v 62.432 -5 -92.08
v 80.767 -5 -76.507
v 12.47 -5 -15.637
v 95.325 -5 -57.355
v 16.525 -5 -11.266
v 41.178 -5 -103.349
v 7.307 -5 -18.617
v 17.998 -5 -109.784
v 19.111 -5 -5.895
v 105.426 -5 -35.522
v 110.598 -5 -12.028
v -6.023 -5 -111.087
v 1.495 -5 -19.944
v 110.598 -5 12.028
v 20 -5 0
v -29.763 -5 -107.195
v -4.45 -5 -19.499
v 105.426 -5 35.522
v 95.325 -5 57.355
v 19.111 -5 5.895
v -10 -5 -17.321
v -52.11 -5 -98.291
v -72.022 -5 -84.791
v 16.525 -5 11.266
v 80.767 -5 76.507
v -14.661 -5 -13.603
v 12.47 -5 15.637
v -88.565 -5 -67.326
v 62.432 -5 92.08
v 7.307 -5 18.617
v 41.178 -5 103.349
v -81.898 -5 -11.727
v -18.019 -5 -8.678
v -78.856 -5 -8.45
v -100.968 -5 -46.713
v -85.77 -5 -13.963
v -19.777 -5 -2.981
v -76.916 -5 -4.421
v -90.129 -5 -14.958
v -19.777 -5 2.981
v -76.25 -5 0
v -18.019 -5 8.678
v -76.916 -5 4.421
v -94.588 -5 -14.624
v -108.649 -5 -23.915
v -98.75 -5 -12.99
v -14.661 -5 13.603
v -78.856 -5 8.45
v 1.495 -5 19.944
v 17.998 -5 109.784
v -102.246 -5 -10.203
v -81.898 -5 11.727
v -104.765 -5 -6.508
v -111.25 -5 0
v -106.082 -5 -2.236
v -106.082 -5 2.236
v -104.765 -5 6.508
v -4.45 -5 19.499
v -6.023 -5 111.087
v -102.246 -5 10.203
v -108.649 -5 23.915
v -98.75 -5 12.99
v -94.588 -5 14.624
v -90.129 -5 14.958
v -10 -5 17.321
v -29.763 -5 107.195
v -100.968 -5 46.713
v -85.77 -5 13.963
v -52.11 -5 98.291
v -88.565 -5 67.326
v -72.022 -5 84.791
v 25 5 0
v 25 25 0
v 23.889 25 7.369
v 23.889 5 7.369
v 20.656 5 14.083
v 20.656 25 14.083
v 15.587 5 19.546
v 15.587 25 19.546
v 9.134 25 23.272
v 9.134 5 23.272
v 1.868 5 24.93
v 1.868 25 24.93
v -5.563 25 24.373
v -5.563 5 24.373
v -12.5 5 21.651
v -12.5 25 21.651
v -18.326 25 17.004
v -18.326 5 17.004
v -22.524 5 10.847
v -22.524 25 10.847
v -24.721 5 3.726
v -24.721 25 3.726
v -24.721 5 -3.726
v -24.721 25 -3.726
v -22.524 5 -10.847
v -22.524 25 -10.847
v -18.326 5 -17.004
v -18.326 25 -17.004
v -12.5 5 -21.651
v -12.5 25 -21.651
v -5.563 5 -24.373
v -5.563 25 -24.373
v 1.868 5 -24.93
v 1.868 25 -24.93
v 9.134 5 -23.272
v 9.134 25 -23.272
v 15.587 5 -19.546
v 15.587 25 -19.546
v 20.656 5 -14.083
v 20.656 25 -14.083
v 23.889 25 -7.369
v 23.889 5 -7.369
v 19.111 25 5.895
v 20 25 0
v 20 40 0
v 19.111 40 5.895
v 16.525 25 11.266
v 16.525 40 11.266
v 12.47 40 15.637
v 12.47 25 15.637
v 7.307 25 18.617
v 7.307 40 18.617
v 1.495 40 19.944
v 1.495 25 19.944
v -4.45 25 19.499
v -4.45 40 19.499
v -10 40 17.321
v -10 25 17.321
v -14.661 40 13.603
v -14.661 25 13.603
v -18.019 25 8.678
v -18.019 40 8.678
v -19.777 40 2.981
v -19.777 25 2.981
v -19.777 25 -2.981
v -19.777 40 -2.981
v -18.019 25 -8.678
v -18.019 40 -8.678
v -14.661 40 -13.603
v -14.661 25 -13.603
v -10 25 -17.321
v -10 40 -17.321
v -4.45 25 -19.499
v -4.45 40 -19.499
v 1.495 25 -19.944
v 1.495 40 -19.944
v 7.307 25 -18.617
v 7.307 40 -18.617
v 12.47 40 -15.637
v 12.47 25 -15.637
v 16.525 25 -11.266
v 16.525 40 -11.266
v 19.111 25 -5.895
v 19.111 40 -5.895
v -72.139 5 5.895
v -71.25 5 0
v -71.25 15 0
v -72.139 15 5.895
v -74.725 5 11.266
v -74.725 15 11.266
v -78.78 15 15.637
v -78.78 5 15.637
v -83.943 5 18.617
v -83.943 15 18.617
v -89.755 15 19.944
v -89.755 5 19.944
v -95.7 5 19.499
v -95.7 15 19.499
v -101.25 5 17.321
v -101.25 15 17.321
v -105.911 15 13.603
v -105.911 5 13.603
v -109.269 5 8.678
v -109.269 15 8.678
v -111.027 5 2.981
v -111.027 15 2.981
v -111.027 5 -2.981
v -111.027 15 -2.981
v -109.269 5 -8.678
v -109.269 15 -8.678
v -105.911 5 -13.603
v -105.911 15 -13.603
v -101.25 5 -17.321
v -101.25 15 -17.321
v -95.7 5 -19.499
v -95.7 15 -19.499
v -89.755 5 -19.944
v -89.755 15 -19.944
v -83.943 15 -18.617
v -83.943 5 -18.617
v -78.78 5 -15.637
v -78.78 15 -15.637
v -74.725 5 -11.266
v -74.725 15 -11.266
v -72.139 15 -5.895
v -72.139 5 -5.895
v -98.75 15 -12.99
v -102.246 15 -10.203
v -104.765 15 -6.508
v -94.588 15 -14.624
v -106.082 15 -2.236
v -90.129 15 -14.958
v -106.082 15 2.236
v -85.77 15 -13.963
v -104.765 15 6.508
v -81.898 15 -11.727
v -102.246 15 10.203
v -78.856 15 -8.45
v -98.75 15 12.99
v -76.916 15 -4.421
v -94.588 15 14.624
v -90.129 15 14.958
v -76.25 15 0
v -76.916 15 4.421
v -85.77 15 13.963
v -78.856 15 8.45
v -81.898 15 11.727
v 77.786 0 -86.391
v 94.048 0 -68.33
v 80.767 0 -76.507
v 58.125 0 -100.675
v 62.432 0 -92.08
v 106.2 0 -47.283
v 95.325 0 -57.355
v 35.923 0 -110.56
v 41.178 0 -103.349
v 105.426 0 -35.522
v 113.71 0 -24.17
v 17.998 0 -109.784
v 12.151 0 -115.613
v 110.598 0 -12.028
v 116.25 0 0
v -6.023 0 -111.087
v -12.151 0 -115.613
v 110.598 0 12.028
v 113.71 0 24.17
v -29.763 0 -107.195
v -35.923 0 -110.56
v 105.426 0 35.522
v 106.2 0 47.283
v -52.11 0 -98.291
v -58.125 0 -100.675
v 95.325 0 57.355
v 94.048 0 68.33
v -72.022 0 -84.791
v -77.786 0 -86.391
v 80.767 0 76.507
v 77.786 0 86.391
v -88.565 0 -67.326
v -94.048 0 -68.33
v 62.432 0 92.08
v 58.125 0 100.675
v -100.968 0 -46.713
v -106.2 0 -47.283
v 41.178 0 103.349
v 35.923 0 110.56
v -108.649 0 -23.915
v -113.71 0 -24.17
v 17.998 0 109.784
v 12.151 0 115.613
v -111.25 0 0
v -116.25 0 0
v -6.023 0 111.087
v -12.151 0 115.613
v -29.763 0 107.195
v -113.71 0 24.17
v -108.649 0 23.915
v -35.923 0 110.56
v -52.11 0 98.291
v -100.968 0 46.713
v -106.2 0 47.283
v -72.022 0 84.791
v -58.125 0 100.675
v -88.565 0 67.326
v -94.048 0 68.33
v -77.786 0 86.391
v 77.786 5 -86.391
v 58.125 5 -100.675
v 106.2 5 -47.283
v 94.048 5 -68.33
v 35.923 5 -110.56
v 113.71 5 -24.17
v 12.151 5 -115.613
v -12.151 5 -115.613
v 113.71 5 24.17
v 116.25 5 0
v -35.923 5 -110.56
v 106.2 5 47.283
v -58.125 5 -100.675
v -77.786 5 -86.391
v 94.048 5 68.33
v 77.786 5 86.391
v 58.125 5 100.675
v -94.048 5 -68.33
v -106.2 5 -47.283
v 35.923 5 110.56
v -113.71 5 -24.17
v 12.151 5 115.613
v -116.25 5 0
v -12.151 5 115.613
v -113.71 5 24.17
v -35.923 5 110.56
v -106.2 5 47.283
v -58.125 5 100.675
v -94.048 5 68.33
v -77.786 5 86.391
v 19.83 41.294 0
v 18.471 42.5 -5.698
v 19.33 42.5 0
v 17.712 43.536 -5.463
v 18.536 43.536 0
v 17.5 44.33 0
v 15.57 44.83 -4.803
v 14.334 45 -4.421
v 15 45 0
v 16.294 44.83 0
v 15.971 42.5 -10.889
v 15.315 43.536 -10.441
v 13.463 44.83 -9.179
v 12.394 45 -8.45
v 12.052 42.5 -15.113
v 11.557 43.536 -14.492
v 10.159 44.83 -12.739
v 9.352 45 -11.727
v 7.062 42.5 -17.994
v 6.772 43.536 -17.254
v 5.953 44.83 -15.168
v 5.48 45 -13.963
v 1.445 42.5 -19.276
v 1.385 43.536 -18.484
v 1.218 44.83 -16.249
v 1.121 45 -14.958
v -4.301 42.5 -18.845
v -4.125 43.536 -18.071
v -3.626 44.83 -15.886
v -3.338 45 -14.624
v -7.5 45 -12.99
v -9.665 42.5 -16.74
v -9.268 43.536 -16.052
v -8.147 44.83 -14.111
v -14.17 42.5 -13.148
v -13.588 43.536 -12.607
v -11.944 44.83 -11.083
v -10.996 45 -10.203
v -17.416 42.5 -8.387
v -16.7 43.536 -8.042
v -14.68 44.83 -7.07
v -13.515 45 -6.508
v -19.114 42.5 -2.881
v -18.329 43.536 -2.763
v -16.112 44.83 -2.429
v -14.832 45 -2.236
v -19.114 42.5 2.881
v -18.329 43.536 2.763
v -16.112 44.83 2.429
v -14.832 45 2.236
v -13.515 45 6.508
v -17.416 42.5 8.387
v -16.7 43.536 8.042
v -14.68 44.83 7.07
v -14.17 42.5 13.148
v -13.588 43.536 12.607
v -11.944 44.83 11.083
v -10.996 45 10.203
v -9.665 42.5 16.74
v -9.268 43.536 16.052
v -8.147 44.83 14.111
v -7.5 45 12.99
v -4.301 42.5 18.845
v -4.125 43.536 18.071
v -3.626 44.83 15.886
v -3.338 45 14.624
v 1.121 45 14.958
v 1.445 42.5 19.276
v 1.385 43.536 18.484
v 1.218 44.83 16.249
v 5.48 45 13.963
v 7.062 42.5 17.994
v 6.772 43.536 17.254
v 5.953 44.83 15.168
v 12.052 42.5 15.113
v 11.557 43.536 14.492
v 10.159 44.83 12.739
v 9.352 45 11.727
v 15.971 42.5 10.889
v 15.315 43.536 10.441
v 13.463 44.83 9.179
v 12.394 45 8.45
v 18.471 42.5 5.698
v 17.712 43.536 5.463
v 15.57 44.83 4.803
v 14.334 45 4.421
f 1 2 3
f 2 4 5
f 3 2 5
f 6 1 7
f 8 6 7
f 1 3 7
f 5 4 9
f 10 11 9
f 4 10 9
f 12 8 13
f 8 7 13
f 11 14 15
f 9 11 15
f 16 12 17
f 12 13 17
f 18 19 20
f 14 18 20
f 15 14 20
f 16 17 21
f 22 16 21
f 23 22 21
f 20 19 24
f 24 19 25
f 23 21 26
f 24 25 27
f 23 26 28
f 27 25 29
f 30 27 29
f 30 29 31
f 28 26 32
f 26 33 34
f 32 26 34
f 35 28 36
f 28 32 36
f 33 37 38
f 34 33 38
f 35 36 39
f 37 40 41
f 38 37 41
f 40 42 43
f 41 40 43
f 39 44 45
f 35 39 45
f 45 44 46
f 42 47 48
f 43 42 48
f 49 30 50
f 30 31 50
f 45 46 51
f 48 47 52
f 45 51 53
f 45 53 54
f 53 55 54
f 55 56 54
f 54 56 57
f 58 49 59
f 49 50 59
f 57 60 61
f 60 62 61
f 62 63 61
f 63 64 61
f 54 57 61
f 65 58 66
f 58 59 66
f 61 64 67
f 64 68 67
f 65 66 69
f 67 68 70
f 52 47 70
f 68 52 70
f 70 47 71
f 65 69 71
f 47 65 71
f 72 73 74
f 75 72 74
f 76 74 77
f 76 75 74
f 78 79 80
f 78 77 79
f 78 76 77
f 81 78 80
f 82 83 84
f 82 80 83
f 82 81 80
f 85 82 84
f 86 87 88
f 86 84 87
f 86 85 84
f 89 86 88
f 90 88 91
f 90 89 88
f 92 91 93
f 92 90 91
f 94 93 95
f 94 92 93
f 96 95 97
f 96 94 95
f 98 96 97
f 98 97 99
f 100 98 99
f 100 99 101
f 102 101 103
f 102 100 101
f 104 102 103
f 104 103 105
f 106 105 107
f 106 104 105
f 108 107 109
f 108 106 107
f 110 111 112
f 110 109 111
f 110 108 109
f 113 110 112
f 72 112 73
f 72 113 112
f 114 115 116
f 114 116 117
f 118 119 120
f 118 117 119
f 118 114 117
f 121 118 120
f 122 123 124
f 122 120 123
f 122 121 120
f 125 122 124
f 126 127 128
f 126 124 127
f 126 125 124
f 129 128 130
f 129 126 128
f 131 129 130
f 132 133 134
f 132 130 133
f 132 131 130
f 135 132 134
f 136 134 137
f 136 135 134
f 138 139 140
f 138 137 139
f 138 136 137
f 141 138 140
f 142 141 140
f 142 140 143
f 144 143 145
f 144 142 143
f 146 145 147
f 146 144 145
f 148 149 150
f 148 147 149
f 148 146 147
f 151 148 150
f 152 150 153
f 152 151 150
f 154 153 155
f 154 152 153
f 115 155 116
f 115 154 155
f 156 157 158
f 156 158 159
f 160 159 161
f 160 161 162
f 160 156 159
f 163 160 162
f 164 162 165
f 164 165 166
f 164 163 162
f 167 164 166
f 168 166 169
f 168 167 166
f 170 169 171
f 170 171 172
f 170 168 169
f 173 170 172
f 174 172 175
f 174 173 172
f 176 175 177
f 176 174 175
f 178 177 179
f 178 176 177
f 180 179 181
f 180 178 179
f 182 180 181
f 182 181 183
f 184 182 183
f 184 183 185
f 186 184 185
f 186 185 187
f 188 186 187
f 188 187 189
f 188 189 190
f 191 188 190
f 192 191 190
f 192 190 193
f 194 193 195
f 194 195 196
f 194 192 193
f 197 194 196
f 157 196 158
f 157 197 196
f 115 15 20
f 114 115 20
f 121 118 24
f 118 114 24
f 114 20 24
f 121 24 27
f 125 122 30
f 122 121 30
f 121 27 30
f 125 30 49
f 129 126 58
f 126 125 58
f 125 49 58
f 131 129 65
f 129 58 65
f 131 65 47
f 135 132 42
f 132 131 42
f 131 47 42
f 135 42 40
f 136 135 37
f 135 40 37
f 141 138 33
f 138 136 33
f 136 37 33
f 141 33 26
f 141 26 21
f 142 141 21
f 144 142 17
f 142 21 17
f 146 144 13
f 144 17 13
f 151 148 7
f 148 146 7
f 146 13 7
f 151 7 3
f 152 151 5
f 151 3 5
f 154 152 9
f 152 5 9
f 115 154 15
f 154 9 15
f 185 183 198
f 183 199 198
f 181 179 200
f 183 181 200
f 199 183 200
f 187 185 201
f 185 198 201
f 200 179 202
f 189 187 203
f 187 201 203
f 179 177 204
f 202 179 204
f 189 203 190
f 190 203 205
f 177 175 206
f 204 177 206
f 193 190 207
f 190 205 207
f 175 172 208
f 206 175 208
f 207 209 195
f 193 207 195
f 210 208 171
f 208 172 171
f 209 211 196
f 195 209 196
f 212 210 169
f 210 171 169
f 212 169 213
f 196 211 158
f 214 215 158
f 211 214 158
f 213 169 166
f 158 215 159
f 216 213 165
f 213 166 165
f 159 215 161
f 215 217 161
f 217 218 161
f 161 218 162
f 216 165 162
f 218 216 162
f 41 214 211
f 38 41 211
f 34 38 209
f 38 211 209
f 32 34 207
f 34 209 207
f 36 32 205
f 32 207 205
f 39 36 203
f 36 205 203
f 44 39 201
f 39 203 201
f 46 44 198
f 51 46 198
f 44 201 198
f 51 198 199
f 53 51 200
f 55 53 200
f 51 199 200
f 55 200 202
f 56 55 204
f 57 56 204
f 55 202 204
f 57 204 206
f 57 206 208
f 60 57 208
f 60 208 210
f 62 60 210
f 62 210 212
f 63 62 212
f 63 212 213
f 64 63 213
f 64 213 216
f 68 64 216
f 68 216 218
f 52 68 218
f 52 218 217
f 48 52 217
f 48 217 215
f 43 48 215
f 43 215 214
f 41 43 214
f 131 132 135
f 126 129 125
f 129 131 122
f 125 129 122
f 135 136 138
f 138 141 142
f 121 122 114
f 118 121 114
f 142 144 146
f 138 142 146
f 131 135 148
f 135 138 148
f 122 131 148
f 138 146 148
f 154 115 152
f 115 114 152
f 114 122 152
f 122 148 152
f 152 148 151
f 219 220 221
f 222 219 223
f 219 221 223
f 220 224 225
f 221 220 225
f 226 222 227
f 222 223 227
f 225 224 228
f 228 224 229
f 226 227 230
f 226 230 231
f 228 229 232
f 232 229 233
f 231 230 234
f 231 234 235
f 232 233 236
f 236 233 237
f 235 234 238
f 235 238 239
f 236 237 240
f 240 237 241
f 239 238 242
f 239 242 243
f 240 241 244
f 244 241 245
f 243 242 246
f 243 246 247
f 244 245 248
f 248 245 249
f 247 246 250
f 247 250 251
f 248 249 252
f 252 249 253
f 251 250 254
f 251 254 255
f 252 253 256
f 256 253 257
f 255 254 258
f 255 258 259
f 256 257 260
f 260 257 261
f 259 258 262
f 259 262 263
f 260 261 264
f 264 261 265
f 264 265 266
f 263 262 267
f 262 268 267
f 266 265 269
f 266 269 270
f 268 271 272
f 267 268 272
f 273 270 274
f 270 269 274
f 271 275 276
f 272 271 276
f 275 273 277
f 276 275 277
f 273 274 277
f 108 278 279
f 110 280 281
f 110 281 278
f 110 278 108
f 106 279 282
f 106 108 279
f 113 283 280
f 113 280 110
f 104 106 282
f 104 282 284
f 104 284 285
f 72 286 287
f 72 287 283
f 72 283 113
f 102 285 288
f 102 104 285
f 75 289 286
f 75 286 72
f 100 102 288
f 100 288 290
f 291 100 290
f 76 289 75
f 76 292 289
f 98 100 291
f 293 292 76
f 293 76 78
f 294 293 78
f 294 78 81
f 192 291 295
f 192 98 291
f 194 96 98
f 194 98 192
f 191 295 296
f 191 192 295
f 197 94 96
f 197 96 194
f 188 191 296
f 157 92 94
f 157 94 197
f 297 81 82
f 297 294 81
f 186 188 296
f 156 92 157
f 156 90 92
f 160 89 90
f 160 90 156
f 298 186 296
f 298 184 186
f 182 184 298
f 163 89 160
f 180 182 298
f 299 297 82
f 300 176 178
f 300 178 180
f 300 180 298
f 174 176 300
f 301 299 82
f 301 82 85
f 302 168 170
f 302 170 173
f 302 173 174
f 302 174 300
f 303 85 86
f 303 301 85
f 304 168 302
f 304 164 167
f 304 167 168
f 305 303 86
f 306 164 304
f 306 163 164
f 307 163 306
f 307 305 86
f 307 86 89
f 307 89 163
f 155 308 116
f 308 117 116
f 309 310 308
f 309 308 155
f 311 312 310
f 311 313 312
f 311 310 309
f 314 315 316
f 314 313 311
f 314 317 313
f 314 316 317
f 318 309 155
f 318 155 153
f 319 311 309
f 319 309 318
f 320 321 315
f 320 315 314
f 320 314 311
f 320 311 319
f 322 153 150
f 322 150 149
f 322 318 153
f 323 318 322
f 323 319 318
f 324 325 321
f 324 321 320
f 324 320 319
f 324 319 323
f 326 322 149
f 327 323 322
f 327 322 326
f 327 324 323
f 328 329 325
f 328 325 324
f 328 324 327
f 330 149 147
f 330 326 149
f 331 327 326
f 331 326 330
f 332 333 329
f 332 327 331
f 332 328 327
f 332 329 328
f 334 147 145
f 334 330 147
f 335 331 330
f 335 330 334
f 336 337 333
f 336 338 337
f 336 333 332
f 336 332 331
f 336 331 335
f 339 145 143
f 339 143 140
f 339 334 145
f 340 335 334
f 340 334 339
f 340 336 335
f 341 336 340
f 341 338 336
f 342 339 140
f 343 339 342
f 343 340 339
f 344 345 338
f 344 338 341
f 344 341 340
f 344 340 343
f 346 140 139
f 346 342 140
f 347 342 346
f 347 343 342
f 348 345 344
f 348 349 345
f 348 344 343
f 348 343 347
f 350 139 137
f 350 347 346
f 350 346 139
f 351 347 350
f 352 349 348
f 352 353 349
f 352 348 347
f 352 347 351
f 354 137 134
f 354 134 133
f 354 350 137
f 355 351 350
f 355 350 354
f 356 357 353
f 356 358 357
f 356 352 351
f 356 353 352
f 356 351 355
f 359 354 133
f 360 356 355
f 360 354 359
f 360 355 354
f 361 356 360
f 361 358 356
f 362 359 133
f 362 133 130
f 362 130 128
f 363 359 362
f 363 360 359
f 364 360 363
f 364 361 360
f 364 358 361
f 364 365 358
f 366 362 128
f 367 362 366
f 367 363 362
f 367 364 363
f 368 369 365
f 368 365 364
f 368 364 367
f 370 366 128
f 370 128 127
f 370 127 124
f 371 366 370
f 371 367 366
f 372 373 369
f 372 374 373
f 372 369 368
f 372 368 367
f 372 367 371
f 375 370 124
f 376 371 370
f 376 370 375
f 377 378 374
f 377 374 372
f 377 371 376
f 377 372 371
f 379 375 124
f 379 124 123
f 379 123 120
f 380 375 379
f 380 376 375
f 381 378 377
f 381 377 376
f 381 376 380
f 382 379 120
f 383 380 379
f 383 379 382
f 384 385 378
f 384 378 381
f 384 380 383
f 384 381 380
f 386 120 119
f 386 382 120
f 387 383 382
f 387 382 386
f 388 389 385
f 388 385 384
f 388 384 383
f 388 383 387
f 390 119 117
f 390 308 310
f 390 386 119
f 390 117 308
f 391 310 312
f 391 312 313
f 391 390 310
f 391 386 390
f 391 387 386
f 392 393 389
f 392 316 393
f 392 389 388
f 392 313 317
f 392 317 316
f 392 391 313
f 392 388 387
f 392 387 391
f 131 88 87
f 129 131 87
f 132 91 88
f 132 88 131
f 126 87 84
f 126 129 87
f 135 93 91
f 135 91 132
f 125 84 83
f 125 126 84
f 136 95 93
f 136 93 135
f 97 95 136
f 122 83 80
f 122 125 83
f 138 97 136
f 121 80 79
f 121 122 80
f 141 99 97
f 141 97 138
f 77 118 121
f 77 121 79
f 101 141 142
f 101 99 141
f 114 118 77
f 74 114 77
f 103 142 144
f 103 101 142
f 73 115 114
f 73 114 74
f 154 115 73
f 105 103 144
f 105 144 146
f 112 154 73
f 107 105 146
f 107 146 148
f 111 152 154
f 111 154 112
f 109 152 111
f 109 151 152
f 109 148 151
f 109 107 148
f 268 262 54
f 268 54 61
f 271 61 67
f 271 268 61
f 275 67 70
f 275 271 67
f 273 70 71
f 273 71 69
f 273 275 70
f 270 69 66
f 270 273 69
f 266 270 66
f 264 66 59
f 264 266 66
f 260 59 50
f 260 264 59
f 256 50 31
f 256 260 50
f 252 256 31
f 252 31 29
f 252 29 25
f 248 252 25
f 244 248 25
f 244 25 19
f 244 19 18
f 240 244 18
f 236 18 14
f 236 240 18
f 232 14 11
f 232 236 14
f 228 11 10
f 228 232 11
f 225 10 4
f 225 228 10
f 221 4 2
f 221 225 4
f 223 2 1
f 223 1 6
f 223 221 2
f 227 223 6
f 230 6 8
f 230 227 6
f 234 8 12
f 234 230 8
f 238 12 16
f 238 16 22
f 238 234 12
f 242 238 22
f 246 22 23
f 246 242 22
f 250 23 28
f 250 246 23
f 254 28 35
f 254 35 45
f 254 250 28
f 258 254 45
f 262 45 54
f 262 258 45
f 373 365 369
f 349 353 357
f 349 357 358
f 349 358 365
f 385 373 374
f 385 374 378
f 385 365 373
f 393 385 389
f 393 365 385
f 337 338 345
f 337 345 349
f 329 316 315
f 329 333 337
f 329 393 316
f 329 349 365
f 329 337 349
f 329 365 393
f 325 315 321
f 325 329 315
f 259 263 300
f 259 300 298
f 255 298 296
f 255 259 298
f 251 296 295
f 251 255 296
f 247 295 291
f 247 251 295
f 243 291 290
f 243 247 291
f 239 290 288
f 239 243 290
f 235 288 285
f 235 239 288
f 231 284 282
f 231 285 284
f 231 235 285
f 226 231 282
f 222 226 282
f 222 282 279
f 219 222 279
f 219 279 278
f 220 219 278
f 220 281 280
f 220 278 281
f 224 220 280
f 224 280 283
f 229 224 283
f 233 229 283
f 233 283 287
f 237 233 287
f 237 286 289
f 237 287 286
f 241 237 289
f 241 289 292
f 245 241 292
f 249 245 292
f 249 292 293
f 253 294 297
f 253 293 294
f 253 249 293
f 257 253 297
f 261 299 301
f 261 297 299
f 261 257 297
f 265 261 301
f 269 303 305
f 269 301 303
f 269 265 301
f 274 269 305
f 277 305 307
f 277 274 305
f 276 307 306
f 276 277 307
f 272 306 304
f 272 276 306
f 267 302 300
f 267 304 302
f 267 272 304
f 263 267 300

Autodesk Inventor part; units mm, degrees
ref_plane "YZ Plane" through (0, 0, 0) normal (1, 0, 0) x (0, 1, 0)
ref_plane "XZ Plane" through (0, 0, 0) normal (0, 1, 0) x (-1, 0, 0)
ref_plane "XY Plane" through (0, 0, 0) normal (0, 0, 1) x (1, 0, 0)
sketch "Skizze1" plane through (0, 0, 0) normal (0, 1, 0) x (-1, 0, 0)
  circle A0 centre (0, 0) radius 116.25
  circle A1 centre (0, 0) radius 111.25
  dimension "d0" = 222.5
  dimension "d1" = 232.5
extrude "Extrusion1" add sketch "Skizze1" against normal blind 5 contours A1
extrude "Extrusion2" add sketch "Skizze1" along normal blind 5 contours A0 | A1
sketch "Skizze2" plane through (0, 5, 0) normal (0, 1, 0) x (1, 0, 0)
  circle A0 centre (0, 0) radius 111.25 projected
  circle A1 centre (0, 0) radius 25
  circle A2 centre (0, 0) radius 20
  dimension "d6" = 50
  dimension "d7" = 40
extrude "Extrusion3" add sketch "Skizze2" along normal blind 20 contours A1
sketch "Skizze3" plane through (0, -5, 0) normal (0, -1, 0) x (1, 0, 0)
  circle A0 centre (-91.25, 0) radius 20
  circle A1 centre (-91.25, 0) radius 15
  circle A2 centre (0, 0) radius 111.25 projected
  dimension "d14" = 40
  dimension "d15" = 30
extrude "Extrusion5" add sketch "Skizze3" against normal blind 20 contours A0
sketch "Skizze4" plane through (-91.25, 5, 0) normal (0, 1, 0) x (1, 0, 0)
  circle A0 centre (0, 0) radius 15 projected
  circle A1 centre (91.25, 0) radius 20 projected
extrude "Extrusion6" cut sketch "Skizze4" against normal up to surface (10 mm away)
sketch "Skizze5" plane through (0, 25, 0) normal (0, 1, 0) x (1, 0, 0)
  circle A0 centre (0, 0) radius 20 projected
extrude "Extrusion7" add sketch "Skizze5" along normal blind 20
fillet "Rundung1" radius 5 1 edges at (-20, 45, 0)
properties part number "5" material "Stahl, Kohlenstoff"
